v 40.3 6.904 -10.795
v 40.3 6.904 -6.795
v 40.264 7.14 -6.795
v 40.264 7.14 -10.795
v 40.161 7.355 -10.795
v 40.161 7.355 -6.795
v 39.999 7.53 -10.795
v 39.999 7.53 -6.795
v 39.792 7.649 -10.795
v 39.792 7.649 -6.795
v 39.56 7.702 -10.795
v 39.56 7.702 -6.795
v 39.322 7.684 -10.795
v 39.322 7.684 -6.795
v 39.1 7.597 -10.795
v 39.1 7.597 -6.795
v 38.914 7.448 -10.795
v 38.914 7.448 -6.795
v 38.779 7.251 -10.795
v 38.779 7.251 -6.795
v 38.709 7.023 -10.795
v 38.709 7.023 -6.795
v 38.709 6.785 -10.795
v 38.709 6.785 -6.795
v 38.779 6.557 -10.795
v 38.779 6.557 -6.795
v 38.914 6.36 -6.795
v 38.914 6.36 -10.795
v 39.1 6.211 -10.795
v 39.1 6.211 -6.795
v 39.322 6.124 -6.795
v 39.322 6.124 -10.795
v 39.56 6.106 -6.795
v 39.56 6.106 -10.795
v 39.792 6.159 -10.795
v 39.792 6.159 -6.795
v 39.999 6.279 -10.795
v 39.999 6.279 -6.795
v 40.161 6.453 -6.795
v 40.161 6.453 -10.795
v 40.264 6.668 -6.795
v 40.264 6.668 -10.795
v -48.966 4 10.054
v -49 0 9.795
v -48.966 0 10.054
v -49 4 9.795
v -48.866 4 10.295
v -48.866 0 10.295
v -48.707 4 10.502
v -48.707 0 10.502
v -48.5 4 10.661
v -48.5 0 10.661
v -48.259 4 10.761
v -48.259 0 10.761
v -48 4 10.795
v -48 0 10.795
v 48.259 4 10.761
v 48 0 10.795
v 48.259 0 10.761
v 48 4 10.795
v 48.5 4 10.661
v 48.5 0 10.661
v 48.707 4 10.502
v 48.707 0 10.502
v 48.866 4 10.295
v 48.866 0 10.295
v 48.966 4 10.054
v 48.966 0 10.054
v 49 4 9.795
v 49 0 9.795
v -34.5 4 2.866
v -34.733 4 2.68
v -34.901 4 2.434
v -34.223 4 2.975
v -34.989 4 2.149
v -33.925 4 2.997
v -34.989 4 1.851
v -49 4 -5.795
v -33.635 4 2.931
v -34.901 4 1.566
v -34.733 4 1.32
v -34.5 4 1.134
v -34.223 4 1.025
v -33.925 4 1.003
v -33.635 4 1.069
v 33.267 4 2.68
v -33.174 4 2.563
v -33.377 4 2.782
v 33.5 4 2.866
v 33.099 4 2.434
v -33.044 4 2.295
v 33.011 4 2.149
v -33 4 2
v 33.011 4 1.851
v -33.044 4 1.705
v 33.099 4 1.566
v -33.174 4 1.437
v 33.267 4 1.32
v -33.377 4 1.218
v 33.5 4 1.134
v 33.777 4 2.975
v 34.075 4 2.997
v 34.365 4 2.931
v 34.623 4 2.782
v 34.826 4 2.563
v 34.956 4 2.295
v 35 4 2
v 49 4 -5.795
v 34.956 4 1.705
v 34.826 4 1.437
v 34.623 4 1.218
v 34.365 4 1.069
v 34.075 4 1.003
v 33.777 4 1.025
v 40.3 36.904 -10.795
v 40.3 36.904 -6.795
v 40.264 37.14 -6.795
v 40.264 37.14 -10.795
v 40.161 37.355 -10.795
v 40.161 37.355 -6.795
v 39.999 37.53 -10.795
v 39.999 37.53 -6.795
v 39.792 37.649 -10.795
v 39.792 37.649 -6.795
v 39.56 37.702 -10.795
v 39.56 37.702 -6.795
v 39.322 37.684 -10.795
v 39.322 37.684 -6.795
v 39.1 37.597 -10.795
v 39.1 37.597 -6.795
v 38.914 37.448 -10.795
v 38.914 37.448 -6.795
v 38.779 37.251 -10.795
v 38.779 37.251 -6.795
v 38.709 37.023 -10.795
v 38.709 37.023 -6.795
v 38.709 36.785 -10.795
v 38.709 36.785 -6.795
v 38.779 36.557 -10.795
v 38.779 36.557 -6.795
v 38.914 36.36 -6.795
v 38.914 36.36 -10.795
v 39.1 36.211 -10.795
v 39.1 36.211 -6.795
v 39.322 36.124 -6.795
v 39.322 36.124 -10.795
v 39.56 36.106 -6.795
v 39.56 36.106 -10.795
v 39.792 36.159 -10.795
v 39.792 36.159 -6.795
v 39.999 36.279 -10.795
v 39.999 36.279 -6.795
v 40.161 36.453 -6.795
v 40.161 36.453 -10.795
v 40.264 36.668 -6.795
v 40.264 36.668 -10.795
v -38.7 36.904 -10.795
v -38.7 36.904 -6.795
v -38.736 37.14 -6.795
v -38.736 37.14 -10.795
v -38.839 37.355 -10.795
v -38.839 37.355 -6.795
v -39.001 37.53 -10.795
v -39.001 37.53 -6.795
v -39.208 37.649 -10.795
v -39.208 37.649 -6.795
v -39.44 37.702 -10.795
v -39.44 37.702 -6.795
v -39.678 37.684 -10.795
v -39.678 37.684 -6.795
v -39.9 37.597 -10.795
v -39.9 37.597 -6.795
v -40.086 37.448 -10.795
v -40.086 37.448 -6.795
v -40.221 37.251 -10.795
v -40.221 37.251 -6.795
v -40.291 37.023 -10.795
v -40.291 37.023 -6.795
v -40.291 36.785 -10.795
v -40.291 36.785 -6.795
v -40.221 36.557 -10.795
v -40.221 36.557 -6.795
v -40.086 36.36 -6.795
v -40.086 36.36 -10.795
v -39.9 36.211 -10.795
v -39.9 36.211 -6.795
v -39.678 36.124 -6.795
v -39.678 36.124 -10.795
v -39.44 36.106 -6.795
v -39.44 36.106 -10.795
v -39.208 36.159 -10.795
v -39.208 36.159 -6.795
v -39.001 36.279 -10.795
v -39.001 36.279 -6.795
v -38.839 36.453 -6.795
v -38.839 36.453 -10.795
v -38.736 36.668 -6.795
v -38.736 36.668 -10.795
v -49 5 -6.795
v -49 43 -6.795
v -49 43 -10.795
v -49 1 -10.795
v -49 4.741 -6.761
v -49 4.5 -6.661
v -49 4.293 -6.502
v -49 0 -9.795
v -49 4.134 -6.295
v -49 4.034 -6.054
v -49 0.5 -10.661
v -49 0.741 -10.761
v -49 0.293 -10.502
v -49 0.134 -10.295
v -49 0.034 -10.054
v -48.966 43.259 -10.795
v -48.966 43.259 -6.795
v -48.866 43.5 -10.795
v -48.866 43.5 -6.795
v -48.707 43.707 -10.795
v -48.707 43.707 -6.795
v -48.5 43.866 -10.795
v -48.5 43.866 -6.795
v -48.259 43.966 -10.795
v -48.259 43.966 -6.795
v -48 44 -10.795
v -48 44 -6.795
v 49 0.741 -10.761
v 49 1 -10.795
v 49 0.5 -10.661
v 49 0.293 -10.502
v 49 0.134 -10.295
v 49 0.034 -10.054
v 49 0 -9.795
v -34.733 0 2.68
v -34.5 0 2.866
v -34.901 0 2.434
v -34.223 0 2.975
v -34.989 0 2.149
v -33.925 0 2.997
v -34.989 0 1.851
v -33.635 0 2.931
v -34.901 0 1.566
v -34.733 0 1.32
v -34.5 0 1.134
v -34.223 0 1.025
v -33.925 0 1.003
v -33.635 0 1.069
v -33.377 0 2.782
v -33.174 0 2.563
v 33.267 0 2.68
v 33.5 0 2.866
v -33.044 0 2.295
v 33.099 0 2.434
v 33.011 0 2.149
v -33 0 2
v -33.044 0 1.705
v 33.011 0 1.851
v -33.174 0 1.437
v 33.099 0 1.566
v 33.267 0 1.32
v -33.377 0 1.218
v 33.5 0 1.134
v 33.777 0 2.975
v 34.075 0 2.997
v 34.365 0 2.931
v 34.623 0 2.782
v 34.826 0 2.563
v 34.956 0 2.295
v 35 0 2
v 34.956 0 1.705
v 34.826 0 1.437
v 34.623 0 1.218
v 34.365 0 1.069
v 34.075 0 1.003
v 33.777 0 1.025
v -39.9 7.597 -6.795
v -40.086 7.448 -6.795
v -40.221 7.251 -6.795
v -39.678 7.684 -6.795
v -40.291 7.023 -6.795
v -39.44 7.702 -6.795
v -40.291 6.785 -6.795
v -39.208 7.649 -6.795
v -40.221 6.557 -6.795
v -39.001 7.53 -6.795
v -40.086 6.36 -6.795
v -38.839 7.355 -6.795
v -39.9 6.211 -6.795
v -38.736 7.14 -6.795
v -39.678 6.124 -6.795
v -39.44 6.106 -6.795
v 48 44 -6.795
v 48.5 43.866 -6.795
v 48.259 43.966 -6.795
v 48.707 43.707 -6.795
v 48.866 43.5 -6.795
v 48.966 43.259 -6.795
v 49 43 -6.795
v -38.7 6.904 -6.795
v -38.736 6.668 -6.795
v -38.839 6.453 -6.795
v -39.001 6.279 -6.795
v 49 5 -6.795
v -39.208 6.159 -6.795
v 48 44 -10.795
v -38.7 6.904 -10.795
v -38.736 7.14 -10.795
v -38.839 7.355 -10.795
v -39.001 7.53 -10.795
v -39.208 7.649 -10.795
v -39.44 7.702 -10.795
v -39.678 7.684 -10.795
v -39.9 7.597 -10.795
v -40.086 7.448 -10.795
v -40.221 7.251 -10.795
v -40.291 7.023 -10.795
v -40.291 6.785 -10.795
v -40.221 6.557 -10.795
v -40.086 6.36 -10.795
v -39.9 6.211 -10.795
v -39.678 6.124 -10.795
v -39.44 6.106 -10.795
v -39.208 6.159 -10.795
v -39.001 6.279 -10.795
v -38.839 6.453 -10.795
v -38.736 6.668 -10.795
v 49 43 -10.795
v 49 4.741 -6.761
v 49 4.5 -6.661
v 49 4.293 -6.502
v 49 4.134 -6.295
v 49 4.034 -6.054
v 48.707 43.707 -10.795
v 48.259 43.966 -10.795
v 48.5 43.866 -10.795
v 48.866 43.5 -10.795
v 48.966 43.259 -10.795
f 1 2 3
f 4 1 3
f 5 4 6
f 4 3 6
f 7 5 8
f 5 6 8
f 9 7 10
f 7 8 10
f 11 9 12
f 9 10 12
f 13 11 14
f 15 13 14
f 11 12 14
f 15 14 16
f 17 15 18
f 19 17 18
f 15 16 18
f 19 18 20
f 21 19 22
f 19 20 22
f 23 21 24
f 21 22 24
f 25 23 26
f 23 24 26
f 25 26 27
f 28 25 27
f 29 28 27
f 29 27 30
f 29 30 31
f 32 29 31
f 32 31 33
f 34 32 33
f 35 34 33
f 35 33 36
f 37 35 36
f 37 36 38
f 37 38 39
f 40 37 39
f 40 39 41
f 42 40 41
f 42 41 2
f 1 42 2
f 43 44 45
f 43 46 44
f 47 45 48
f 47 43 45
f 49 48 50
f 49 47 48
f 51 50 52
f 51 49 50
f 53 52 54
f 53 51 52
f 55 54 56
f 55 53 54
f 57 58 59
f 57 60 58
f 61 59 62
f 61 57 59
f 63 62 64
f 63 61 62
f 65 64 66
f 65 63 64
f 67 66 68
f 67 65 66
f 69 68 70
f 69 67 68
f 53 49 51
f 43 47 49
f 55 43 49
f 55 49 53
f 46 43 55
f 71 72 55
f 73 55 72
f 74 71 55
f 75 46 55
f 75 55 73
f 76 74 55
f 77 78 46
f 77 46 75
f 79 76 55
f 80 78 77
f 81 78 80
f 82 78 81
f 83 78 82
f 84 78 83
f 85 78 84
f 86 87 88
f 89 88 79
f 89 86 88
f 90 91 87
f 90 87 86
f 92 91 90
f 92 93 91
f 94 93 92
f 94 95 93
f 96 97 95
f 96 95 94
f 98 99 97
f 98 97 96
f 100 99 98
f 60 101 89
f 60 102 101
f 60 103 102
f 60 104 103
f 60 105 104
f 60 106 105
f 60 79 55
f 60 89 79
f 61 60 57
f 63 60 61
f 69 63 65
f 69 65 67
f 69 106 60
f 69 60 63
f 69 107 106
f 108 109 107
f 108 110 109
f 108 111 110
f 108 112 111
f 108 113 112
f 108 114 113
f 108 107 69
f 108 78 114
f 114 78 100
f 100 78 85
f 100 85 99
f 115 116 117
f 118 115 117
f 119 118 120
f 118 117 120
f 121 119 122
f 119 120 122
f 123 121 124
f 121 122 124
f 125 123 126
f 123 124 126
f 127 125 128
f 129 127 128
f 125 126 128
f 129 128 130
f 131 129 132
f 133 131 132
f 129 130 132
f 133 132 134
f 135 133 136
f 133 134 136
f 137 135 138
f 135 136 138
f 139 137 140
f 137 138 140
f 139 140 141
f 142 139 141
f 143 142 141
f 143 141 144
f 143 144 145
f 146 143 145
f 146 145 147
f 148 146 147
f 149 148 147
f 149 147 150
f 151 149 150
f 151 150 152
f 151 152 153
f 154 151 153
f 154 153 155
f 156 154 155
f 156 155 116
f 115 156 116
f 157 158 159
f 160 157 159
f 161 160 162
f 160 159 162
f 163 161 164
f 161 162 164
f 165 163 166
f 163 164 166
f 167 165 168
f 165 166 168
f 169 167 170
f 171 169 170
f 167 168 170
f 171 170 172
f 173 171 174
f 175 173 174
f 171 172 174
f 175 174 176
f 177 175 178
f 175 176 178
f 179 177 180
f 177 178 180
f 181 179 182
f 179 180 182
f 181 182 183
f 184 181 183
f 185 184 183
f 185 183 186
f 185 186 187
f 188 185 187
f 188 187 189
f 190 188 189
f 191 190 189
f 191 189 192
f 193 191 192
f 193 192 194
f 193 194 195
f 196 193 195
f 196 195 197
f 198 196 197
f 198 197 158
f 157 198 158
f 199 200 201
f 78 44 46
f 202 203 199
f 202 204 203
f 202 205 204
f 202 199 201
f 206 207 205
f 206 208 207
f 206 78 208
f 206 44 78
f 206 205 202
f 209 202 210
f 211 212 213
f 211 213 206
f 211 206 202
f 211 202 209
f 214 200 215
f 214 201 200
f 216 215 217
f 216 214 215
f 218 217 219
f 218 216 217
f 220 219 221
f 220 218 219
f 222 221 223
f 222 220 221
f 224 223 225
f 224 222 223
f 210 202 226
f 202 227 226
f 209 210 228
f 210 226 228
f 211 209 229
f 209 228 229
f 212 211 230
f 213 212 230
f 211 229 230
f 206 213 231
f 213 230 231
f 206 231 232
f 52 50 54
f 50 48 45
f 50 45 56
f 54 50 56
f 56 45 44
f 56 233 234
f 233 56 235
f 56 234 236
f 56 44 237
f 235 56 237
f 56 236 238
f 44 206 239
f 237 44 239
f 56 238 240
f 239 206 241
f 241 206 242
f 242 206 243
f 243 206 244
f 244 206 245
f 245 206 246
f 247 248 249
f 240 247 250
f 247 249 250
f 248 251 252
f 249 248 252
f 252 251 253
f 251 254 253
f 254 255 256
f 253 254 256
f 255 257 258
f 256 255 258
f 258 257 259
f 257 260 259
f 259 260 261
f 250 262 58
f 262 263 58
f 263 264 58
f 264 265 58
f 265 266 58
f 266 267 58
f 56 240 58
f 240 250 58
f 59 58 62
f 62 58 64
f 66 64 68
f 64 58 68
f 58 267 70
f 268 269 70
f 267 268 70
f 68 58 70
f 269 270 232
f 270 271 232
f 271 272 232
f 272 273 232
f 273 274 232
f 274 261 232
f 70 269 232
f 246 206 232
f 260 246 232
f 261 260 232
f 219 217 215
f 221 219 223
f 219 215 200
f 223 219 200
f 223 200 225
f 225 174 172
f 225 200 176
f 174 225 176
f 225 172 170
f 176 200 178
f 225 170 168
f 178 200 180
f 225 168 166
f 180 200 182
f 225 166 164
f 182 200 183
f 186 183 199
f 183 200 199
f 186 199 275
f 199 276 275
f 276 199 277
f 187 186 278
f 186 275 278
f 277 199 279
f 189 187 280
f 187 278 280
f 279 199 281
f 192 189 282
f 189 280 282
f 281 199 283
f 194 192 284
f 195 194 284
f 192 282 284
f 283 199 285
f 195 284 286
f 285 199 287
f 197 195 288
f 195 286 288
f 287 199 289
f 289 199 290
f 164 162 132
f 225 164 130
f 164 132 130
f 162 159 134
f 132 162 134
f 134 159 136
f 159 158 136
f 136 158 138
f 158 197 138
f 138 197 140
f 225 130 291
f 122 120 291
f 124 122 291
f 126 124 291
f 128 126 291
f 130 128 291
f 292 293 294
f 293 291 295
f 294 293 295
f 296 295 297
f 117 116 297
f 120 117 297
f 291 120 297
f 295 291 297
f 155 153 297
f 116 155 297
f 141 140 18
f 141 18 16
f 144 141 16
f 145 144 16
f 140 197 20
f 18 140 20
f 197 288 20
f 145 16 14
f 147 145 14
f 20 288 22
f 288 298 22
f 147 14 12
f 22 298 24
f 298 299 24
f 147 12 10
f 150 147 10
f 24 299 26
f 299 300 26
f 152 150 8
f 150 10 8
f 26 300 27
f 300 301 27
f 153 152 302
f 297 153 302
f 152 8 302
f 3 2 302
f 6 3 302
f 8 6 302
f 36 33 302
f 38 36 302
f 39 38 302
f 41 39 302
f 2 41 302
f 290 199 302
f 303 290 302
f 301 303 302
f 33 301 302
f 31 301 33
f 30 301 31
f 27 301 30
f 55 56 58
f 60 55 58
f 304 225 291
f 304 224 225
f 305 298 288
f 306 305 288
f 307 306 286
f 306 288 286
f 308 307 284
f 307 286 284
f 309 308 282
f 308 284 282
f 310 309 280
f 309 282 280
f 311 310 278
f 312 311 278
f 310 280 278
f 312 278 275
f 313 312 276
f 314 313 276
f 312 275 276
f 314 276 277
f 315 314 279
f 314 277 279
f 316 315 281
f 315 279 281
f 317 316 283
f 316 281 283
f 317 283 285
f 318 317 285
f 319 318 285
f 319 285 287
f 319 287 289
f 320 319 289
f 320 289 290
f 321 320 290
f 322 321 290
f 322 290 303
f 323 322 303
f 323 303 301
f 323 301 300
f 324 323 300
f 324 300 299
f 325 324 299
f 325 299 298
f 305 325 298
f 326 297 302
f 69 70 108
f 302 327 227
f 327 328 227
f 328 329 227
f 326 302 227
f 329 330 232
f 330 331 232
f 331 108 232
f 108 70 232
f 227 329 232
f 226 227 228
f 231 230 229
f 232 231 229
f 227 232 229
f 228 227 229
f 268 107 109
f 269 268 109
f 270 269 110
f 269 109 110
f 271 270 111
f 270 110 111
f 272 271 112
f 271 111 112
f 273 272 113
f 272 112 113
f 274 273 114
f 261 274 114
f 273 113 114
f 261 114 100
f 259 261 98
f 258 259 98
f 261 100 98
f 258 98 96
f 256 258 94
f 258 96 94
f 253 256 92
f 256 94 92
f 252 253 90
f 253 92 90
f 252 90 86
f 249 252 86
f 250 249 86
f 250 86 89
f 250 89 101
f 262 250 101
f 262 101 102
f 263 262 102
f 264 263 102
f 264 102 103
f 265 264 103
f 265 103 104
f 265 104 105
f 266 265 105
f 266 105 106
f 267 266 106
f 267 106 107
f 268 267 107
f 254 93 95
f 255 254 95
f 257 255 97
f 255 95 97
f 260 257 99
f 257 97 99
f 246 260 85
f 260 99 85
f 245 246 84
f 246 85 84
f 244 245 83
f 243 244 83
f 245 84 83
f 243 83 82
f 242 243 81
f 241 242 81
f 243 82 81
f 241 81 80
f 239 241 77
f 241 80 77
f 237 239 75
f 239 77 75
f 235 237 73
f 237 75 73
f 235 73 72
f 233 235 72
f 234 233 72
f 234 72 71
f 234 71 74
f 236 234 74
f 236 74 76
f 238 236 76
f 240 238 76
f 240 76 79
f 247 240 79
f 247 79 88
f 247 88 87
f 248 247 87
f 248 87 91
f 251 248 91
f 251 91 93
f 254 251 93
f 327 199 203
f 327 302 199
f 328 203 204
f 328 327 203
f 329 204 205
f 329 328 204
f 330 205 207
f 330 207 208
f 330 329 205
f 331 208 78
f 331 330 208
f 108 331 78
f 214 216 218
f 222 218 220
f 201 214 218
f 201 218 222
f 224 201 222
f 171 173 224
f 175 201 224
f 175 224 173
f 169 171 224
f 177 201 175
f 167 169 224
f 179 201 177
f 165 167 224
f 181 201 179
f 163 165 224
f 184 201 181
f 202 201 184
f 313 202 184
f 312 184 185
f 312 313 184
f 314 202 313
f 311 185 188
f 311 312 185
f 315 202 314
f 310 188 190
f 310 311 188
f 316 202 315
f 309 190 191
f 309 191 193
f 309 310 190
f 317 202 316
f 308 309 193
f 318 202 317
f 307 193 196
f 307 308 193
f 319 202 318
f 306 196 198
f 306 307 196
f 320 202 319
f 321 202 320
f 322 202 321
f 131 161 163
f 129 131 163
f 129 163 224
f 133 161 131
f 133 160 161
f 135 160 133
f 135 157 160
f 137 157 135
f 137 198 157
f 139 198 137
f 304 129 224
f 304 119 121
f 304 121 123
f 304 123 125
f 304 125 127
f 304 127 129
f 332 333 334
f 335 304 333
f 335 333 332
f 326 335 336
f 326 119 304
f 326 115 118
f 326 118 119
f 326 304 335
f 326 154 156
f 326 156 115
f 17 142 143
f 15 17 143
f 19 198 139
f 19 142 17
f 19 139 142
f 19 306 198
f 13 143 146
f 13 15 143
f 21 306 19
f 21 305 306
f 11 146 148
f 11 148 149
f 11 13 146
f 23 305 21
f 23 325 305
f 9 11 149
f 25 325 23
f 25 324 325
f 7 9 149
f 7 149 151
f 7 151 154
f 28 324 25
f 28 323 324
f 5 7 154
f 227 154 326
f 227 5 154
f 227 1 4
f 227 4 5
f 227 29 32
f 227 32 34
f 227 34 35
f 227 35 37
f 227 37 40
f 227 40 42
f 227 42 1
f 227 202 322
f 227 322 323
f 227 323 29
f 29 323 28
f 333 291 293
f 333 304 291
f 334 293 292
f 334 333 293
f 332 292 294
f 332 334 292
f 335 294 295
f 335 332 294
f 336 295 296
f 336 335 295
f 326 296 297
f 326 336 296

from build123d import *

# Parameters (mm, degrees)
SKETCH1_W           = 98
SKETCH1_H           = 21.59
BOSS_EXTRUDE1_DEPTH = 4
SKETCH2_W           = 98
SKETCH2_H           = 4
BOSS_EXTRUDE2_DEPTH = 40
SKETCH3_R           = 0.8
CUT_EXTRUDE1_DEPTH  = 21
FILLET1_R           = 1
SKETCH4_R           = 1
CUT_EXTRUDE2_DEPTH  = 21


with BuildPart() as part:
    # Sketch1 → Boss-Extrude1 (new body)
    with BuildSketch(Plane(origin=(0, 0, 0), x_dir=(1, 0, 0), z_dir=(0, 1, 0))):
        Rectangle(SKETCH1_W, SKETCH1_H)
    extrude(amount=BOSS_EXTRUDE1_DEPTH)

    # Sketch2 → Boss-Extrude2 (add)
    with BuildSketch(Plane(origin=(0, 4, 0), x_dir=(1, 0, 0), z_dir=(0, 1, 0))):
        with Locations((0, 8.795)):
            Rectangle(SKETCH2_W, SKETCH2_H)
    extrude(amount=BOSS_EXTRUDE2_DEPTH)

    # Sketch3 → Cut-Extrude1 (cut)
    with BuildSketch(Plane.XY.offset(-6.795)):
        with Locations((-39.5, 6.904051391)):
            Circle(SKETCH3_R)
        with Locations((-39.5, 36.904051391)):
            Circle(SKETCH3_R)
        with Locations((39.5, 36.904051391)):
            Circle(SKETCH3_R)
        with Locations((39.5, 6.904051391)):
            Circle(SKETCH3_R)
    extrude(amount=-CUT_EXTRUDE1_DEPTH, mode=Mode.SUBTRACT)

    # Fillet1
    fillet1_edges = [part.edges().sort_by_distance(p)[0] for p in [
        (0, 4, -6.795),
        (49, 44, -8.795),
        (-49, 44, -8.795),
        (0, 0, -10.795),
        (49, 2, 10.795),
        (-49, 2, 10.795),
    ]]
    fillet(fillet1_edges, radius=FILLET1_R)

    # Sketch4 → Cut-Extrude2 (cut)
    with BuildSketch(Plane(origin=(0, 4, 0), x_dir=(1, 0, 0), z_dir=(0, 1, 0))):
        with Locations((-34, -2)):
            Circle(SKETCH4_R)
        with Locations((34, -2)):
            Circle(SKETCH4_R)
    extrude(amount=-CUT_EXTRUDE2_DEPTH, mode=Mode.SUBTRACT)


solid = part.part
